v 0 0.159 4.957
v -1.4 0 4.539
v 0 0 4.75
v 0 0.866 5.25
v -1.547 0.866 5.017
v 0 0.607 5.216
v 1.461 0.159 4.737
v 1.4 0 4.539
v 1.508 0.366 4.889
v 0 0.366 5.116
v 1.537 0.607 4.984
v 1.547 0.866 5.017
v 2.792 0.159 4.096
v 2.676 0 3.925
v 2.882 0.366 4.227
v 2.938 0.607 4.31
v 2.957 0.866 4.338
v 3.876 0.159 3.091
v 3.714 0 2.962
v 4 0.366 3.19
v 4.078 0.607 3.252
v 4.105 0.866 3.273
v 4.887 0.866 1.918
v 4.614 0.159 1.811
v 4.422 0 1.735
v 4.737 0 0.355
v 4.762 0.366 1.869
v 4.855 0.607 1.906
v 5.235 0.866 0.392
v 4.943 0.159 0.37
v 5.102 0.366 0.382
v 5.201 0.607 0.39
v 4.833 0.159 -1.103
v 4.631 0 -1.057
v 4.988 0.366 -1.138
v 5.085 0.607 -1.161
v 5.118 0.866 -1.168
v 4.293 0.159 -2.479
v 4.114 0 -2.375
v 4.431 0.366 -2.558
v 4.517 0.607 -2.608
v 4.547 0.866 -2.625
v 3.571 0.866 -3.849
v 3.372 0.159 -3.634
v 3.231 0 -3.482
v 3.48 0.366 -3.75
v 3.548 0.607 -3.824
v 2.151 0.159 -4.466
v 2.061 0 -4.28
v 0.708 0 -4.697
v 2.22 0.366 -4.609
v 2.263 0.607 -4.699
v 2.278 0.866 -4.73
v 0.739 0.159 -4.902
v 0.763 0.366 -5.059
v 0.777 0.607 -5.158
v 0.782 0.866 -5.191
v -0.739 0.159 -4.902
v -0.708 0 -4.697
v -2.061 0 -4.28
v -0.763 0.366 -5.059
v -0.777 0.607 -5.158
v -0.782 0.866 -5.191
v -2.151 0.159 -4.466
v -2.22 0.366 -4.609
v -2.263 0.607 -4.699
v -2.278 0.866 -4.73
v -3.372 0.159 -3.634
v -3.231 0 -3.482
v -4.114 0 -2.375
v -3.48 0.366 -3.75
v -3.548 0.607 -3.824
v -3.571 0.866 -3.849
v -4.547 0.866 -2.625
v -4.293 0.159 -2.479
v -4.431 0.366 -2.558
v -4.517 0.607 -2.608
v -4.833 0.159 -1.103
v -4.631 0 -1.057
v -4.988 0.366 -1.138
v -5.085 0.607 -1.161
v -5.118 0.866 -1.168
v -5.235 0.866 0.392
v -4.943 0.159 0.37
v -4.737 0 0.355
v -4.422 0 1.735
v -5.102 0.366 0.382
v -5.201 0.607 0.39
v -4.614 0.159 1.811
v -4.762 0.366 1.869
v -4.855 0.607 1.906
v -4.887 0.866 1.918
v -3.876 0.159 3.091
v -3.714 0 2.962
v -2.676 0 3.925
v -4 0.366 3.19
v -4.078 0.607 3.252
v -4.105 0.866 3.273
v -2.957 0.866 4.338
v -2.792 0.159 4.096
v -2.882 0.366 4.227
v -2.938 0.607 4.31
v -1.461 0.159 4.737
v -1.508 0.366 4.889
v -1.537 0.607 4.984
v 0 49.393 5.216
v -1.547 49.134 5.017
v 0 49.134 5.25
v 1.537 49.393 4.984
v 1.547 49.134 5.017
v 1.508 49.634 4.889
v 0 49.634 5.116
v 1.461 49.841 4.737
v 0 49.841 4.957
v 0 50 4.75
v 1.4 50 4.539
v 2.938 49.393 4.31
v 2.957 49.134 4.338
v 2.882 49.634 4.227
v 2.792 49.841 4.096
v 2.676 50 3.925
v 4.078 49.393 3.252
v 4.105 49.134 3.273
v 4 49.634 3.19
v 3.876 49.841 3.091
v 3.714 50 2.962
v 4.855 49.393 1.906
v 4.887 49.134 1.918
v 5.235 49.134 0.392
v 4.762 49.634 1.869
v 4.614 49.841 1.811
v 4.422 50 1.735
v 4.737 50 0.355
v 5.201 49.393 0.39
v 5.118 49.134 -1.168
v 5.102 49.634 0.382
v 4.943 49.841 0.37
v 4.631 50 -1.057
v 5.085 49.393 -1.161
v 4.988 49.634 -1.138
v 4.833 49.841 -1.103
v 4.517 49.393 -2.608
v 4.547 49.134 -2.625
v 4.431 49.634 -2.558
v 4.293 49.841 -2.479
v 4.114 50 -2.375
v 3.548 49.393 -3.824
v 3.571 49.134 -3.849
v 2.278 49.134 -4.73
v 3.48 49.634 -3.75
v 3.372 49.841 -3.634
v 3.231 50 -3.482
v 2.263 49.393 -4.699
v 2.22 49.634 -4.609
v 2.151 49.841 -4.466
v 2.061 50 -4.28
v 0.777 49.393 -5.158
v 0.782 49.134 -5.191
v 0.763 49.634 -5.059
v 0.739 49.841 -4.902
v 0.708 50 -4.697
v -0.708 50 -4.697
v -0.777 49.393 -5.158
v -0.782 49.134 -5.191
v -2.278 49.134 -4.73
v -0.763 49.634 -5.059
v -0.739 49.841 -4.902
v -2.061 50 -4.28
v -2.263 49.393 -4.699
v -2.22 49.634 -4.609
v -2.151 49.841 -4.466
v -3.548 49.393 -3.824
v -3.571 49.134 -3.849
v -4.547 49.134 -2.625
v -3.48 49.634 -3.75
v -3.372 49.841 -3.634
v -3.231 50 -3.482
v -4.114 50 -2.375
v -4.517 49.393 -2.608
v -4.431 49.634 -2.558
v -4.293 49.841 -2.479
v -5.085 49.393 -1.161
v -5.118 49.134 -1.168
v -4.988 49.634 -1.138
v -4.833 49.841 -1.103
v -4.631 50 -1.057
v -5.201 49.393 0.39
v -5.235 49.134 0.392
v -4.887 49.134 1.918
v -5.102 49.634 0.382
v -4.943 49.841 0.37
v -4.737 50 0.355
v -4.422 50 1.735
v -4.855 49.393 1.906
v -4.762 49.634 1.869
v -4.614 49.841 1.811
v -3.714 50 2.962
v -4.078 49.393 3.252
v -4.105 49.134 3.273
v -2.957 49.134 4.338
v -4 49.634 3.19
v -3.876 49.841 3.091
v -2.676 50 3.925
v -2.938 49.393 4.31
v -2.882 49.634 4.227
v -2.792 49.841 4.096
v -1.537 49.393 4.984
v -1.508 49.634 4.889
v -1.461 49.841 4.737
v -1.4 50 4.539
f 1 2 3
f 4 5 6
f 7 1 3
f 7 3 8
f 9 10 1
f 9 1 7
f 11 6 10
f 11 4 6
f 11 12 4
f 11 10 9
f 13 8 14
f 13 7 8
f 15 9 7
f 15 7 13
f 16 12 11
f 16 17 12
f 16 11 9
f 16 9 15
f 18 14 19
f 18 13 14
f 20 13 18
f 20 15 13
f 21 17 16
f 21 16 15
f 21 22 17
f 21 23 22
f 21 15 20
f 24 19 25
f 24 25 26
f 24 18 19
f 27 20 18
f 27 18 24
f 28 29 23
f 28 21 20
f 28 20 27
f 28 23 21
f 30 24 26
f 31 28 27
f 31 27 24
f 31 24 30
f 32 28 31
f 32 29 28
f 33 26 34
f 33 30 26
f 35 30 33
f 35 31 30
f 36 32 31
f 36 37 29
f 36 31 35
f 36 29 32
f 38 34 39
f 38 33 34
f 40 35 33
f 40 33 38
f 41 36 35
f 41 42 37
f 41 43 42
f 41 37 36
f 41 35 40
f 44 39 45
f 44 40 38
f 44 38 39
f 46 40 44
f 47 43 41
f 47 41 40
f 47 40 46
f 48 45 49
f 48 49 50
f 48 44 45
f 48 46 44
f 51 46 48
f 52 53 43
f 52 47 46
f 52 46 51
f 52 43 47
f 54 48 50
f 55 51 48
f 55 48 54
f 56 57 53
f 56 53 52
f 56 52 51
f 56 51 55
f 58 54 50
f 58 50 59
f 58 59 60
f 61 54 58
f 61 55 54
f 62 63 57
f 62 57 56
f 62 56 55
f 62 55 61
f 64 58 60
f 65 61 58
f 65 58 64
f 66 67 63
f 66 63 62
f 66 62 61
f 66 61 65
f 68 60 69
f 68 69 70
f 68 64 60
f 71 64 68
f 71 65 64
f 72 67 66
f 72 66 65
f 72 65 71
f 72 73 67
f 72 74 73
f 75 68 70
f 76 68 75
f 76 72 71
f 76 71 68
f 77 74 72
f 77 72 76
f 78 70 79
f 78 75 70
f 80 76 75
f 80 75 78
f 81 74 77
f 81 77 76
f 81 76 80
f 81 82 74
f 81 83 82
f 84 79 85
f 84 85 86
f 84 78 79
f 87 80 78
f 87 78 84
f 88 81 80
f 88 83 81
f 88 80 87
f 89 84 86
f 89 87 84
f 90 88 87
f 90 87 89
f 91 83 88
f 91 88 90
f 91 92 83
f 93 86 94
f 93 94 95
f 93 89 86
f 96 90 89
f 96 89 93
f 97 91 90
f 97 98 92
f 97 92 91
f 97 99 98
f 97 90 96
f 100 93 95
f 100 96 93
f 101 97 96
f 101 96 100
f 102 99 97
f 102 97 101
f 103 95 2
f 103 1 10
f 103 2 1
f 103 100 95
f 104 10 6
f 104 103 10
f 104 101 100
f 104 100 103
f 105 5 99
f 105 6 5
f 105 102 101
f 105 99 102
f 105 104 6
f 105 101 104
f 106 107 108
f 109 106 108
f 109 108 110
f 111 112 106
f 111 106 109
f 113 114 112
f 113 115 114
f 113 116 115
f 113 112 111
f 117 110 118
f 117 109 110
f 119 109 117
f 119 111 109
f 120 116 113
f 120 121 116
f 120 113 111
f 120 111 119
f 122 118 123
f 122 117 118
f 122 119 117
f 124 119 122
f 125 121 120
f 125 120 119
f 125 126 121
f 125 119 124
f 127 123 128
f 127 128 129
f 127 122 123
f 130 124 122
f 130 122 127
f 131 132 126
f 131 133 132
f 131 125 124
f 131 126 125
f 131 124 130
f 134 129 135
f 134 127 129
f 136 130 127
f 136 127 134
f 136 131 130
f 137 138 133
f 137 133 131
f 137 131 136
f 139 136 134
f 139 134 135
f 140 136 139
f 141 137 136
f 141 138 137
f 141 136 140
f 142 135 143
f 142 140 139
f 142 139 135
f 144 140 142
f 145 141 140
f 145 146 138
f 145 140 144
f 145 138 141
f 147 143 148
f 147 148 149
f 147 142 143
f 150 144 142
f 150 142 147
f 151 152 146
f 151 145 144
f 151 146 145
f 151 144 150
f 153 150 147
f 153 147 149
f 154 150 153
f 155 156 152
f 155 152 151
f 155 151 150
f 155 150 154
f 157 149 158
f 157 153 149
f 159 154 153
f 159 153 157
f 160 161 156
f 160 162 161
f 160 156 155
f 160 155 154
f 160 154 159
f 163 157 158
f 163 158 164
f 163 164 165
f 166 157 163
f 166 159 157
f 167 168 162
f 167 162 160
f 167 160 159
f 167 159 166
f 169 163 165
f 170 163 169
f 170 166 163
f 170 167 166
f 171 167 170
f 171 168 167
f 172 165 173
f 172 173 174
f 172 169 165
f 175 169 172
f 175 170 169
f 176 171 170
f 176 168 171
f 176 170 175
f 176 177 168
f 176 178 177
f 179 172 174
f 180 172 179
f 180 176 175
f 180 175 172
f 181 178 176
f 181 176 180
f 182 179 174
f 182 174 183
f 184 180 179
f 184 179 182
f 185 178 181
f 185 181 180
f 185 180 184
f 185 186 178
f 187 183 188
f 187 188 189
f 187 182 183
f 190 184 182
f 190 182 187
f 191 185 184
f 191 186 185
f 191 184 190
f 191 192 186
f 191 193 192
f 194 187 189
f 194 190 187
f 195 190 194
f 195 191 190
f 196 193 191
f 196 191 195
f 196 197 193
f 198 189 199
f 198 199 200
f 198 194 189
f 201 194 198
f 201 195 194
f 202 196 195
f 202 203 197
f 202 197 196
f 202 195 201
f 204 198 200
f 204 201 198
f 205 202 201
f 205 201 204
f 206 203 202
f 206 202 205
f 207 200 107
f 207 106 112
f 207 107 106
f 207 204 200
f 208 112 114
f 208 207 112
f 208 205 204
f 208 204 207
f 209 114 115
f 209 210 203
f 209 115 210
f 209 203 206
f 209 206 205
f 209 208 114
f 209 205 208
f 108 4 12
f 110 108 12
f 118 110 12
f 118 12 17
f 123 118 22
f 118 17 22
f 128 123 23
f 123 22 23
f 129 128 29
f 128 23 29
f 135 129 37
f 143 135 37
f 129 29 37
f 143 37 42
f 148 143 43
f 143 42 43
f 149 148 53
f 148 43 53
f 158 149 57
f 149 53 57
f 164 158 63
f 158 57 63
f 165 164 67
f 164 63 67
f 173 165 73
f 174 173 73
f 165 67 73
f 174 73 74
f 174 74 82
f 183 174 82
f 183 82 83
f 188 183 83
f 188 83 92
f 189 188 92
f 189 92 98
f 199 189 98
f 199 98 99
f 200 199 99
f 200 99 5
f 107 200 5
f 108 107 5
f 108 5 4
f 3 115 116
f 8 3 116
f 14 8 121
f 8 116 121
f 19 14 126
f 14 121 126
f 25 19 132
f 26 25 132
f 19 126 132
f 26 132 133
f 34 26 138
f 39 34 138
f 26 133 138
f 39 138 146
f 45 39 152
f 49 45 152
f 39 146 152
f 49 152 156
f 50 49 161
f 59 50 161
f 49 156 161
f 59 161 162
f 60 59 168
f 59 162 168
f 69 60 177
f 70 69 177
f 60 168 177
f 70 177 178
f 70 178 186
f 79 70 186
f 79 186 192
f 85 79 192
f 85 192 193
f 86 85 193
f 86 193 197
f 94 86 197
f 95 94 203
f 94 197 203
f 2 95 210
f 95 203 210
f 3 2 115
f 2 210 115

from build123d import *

# Parameters (mm, degrees)
SKETCH1_R           = 5.25
BOSS_EXTRUDE1_DEPTH = 50
SKETCH2_R           = 4.75
CUT_EXTRUDE1_DEPTH  = 50
FILLET1_R           = 1


with BuildPart() as part:
    # Sketch1 → Boss-Extrude1 (new body)
    with BuildSketch(Plane(origin=(0, 0, 0), x_dir=(1, 0, 0), z_dir=(0, 1, 0))):
        with Locations(Location((0, 0, 0), (0, 0, 270))):
            Circle(SKETCH1_R)
    extrude(amount=BOSS_EXTRUDE1_DEPTH)

    # Sketch2 → Cut-Extrude1 (cut)
    with BuildSketch(Plane(origin=(0, 50, 0), x_dir=(1, 0, 0), z_dir=(0, 1, 0))):
        with Locations(Location((0, 0, 0), (0, 0, 270))):
            Circle(SKETCH2_R)
    extrude(amount=-CUT_EXTRUDE1_DEPTH, mode=Mode.SUBTRACT)

    # Fillet1
    # the kernel refuses this fillet: 1 mm, written as the material it takes off along each edge
    with BuildSketch(Plane(origin=(0, 0, 0), x_dir=(0, 0, 1), z_dir=(-1, 0, 0))) as fillet1_piece_1:
        with BuildLine():
            CenterArc((4.25, 0.866025404), FILLET1_R, 300, 60)
            Line((4.75, 0), (4.76, -0.017320508))
            ThreePointArc((4.76, -0.017320508), (5, -0.02), (5.25, -0.02))
            Line((5.25, -0.02), (5.27, 0))
            Line((5.27, 0), (5.27, 0.866025404))
            Line((5.27, 0.866025404), (5.25, 0.866025404))
        make_face()
    revolve(axis=Axis((0, 0, 0), (0, 1, 0)), mode=Mode.SUBTRACT)
    with BuildSketch(Plane(origin=(0, 50, 0), x_dir=(0, 0, 1), z_dir=(-1, 0, 0))) as fillet1_piece_2:
        with BuildLine():
            CenterArc((4.25, -0.866025404), FILLET1_R, 0, 60)
            Line((4.75, 0), (4.76, 0.017320508))
            ThreePointArc((4.76, 0.017320508), (5, 0.02), (5.25, 0.02))
            Line((5.25, 0.02), (5.27, 0))
            Line((5.27, 0), (5.27, -0.866025404))
            Line((5.27, -0.866025404), (5.25, -0.866025404))
        make_face()
    revolve(axis=Axis((0, 50, 0), (0, 1, 0)), mode=Mode.SUBTRACT)


solid = part.part
